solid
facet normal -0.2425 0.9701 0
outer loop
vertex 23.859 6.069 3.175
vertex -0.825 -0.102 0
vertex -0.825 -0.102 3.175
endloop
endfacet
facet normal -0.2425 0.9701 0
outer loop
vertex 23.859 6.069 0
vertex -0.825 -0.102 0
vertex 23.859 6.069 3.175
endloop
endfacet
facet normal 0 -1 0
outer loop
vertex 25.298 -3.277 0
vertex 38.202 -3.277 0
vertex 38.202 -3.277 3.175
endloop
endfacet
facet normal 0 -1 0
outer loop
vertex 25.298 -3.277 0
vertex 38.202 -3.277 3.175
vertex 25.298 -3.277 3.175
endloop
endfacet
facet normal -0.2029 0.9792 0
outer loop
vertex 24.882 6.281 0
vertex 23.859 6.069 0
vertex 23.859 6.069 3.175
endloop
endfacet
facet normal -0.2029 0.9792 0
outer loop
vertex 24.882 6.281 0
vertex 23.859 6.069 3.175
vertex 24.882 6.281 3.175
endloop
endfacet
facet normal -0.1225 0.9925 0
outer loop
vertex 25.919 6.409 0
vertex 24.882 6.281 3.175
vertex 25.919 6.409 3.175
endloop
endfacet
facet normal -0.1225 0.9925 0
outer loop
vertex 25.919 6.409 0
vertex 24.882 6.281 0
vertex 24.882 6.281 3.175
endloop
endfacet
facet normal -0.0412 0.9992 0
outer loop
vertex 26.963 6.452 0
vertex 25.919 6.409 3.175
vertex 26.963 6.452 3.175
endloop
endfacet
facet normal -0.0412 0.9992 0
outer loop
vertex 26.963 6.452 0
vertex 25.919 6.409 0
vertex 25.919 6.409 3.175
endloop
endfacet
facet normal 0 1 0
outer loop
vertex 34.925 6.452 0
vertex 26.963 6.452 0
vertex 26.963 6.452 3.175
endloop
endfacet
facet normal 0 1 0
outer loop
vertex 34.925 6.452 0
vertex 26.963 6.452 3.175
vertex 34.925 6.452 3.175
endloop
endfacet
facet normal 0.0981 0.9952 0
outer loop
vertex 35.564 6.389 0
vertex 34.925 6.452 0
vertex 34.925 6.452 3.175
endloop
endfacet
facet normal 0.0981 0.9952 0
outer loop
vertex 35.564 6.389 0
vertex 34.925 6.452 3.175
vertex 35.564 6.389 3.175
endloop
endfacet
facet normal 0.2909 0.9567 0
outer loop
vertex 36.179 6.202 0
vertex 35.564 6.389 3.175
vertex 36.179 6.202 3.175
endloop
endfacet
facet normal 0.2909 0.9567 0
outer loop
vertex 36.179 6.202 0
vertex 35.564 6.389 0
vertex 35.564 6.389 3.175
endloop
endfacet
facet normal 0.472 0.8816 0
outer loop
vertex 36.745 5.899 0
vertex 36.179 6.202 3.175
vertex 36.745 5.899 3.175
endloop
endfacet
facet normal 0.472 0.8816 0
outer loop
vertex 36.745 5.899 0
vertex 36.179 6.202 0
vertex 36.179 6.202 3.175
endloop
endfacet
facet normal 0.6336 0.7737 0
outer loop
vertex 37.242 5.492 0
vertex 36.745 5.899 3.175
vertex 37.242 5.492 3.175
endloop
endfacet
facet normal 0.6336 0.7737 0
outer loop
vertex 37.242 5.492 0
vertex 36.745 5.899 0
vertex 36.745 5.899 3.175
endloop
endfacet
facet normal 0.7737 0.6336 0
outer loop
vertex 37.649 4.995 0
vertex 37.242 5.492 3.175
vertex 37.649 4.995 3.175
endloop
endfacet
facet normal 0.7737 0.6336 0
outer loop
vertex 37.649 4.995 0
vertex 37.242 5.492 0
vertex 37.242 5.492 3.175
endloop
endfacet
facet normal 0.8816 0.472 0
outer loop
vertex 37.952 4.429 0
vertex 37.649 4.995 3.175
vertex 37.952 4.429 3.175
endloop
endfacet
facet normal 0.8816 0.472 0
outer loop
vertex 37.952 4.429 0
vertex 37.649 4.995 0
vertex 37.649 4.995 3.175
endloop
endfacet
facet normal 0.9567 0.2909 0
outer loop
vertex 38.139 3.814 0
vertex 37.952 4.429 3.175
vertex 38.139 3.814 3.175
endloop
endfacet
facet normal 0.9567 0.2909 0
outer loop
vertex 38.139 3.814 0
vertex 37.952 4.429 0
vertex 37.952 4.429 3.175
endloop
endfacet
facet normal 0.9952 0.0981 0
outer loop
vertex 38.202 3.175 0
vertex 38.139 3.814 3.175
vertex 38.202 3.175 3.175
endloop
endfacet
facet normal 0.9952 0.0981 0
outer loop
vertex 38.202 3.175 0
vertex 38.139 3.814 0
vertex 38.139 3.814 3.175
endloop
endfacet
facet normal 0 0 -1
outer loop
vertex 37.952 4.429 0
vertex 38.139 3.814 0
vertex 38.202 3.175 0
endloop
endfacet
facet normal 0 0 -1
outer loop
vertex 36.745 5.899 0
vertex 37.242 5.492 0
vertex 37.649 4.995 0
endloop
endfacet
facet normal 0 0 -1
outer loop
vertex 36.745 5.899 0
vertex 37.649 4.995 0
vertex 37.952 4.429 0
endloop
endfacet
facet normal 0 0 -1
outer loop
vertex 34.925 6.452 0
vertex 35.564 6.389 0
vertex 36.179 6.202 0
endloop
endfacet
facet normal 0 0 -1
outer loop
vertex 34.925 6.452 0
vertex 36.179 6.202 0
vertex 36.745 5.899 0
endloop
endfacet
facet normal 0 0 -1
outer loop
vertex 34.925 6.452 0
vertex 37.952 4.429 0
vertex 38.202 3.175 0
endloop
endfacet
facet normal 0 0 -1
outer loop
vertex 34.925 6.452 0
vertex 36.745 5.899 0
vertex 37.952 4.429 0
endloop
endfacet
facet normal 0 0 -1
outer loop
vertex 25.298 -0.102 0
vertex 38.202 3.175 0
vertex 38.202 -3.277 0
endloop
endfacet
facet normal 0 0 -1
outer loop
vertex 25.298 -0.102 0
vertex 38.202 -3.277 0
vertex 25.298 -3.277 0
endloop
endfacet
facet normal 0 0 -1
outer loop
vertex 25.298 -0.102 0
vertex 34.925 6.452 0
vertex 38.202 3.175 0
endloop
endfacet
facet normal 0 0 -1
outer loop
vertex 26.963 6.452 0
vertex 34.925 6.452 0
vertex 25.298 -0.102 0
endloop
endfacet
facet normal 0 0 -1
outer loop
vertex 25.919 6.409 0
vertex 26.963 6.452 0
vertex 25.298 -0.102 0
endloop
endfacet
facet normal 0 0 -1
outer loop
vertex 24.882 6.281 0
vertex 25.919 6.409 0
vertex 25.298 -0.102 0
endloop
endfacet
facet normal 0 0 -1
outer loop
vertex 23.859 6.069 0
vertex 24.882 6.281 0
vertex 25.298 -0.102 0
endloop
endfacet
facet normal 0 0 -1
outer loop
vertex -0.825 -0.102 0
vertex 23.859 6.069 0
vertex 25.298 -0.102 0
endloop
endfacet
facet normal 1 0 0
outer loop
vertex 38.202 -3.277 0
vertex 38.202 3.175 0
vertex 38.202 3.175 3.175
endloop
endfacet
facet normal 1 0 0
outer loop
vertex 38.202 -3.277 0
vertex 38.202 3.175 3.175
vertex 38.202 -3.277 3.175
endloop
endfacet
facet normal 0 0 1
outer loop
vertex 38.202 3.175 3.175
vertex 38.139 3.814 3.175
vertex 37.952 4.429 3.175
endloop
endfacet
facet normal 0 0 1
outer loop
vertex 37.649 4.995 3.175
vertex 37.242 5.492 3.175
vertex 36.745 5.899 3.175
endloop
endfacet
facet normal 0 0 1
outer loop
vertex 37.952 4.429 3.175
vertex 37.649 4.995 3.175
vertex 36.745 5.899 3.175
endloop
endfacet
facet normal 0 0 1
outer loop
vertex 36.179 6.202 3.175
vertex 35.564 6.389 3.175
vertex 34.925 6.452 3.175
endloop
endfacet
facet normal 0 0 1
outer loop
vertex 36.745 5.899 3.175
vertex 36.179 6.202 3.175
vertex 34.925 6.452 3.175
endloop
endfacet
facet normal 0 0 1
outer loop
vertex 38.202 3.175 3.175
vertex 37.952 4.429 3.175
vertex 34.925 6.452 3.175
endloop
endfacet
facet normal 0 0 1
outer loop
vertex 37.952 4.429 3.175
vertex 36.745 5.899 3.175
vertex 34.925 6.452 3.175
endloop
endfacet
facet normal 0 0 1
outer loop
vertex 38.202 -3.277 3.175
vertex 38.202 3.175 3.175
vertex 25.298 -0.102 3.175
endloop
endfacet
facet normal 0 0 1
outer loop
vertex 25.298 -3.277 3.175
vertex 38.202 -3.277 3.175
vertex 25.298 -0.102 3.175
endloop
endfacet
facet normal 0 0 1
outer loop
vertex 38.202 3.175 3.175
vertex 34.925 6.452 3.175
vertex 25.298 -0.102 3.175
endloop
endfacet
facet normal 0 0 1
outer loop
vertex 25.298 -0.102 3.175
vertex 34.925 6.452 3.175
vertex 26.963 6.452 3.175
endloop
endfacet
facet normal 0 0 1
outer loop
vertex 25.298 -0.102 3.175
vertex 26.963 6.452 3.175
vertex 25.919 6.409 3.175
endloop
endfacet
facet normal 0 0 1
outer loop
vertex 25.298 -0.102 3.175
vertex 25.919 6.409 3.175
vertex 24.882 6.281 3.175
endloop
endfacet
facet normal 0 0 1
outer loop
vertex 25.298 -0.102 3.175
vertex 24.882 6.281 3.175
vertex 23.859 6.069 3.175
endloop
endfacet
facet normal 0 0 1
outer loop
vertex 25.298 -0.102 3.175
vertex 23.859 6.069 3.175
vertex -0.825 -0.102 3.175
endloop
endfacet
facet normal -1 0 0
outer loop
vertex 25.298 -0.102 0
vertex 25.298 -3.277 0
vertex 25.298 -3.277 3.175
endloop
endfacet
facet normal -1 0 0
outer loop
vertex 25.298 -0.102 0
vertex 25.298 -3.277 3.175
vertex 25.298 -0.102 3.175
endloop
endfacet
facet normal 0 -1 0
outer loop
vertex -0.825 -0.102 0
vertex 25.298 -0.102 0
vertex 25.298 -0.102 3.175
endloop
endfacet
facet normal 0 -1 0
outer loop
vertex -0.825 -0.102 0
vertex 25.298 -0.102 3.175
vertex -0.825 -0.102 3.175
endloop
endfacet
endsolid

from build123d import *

# Parameters (mm, degrees)
BOSS_EXTRUDE1_DEPTH = 3.175


with BuildPart() as part:
    # Sketch1 → Boss-Extrude1 (new body)
    with BuildSketch(Plane.XY):
        with BuildLine():
            Line((38.2016, 3.175), (38.2016, -3.2766))
            Line((38.2016, -3.2766), (25.2984, -3.2766))
            Line((25.2984, -3.2766), (25.2984, -0.1016))
            Line((25.2984, -0.1016), (-0.825307532, -0.1016))
            Line((-0.825307532, -0.1016), (23.858597388, 6.06937623))
            ThreePointArc((23.858597388, 6.06937623), (25.399300177, 6.355684738), (26.963441445, 6.4516))
            Line((26.963441445, 6.4516), (34.925, 6.4516))
            ThreePointArc((34.925, 6.4516), (37.241906079, 5.491906079), (38.2016, 3.175))
        make_face()
    extrude(amount=BOSS_EXTRUDE1_DEPTH)


solid = part.part
